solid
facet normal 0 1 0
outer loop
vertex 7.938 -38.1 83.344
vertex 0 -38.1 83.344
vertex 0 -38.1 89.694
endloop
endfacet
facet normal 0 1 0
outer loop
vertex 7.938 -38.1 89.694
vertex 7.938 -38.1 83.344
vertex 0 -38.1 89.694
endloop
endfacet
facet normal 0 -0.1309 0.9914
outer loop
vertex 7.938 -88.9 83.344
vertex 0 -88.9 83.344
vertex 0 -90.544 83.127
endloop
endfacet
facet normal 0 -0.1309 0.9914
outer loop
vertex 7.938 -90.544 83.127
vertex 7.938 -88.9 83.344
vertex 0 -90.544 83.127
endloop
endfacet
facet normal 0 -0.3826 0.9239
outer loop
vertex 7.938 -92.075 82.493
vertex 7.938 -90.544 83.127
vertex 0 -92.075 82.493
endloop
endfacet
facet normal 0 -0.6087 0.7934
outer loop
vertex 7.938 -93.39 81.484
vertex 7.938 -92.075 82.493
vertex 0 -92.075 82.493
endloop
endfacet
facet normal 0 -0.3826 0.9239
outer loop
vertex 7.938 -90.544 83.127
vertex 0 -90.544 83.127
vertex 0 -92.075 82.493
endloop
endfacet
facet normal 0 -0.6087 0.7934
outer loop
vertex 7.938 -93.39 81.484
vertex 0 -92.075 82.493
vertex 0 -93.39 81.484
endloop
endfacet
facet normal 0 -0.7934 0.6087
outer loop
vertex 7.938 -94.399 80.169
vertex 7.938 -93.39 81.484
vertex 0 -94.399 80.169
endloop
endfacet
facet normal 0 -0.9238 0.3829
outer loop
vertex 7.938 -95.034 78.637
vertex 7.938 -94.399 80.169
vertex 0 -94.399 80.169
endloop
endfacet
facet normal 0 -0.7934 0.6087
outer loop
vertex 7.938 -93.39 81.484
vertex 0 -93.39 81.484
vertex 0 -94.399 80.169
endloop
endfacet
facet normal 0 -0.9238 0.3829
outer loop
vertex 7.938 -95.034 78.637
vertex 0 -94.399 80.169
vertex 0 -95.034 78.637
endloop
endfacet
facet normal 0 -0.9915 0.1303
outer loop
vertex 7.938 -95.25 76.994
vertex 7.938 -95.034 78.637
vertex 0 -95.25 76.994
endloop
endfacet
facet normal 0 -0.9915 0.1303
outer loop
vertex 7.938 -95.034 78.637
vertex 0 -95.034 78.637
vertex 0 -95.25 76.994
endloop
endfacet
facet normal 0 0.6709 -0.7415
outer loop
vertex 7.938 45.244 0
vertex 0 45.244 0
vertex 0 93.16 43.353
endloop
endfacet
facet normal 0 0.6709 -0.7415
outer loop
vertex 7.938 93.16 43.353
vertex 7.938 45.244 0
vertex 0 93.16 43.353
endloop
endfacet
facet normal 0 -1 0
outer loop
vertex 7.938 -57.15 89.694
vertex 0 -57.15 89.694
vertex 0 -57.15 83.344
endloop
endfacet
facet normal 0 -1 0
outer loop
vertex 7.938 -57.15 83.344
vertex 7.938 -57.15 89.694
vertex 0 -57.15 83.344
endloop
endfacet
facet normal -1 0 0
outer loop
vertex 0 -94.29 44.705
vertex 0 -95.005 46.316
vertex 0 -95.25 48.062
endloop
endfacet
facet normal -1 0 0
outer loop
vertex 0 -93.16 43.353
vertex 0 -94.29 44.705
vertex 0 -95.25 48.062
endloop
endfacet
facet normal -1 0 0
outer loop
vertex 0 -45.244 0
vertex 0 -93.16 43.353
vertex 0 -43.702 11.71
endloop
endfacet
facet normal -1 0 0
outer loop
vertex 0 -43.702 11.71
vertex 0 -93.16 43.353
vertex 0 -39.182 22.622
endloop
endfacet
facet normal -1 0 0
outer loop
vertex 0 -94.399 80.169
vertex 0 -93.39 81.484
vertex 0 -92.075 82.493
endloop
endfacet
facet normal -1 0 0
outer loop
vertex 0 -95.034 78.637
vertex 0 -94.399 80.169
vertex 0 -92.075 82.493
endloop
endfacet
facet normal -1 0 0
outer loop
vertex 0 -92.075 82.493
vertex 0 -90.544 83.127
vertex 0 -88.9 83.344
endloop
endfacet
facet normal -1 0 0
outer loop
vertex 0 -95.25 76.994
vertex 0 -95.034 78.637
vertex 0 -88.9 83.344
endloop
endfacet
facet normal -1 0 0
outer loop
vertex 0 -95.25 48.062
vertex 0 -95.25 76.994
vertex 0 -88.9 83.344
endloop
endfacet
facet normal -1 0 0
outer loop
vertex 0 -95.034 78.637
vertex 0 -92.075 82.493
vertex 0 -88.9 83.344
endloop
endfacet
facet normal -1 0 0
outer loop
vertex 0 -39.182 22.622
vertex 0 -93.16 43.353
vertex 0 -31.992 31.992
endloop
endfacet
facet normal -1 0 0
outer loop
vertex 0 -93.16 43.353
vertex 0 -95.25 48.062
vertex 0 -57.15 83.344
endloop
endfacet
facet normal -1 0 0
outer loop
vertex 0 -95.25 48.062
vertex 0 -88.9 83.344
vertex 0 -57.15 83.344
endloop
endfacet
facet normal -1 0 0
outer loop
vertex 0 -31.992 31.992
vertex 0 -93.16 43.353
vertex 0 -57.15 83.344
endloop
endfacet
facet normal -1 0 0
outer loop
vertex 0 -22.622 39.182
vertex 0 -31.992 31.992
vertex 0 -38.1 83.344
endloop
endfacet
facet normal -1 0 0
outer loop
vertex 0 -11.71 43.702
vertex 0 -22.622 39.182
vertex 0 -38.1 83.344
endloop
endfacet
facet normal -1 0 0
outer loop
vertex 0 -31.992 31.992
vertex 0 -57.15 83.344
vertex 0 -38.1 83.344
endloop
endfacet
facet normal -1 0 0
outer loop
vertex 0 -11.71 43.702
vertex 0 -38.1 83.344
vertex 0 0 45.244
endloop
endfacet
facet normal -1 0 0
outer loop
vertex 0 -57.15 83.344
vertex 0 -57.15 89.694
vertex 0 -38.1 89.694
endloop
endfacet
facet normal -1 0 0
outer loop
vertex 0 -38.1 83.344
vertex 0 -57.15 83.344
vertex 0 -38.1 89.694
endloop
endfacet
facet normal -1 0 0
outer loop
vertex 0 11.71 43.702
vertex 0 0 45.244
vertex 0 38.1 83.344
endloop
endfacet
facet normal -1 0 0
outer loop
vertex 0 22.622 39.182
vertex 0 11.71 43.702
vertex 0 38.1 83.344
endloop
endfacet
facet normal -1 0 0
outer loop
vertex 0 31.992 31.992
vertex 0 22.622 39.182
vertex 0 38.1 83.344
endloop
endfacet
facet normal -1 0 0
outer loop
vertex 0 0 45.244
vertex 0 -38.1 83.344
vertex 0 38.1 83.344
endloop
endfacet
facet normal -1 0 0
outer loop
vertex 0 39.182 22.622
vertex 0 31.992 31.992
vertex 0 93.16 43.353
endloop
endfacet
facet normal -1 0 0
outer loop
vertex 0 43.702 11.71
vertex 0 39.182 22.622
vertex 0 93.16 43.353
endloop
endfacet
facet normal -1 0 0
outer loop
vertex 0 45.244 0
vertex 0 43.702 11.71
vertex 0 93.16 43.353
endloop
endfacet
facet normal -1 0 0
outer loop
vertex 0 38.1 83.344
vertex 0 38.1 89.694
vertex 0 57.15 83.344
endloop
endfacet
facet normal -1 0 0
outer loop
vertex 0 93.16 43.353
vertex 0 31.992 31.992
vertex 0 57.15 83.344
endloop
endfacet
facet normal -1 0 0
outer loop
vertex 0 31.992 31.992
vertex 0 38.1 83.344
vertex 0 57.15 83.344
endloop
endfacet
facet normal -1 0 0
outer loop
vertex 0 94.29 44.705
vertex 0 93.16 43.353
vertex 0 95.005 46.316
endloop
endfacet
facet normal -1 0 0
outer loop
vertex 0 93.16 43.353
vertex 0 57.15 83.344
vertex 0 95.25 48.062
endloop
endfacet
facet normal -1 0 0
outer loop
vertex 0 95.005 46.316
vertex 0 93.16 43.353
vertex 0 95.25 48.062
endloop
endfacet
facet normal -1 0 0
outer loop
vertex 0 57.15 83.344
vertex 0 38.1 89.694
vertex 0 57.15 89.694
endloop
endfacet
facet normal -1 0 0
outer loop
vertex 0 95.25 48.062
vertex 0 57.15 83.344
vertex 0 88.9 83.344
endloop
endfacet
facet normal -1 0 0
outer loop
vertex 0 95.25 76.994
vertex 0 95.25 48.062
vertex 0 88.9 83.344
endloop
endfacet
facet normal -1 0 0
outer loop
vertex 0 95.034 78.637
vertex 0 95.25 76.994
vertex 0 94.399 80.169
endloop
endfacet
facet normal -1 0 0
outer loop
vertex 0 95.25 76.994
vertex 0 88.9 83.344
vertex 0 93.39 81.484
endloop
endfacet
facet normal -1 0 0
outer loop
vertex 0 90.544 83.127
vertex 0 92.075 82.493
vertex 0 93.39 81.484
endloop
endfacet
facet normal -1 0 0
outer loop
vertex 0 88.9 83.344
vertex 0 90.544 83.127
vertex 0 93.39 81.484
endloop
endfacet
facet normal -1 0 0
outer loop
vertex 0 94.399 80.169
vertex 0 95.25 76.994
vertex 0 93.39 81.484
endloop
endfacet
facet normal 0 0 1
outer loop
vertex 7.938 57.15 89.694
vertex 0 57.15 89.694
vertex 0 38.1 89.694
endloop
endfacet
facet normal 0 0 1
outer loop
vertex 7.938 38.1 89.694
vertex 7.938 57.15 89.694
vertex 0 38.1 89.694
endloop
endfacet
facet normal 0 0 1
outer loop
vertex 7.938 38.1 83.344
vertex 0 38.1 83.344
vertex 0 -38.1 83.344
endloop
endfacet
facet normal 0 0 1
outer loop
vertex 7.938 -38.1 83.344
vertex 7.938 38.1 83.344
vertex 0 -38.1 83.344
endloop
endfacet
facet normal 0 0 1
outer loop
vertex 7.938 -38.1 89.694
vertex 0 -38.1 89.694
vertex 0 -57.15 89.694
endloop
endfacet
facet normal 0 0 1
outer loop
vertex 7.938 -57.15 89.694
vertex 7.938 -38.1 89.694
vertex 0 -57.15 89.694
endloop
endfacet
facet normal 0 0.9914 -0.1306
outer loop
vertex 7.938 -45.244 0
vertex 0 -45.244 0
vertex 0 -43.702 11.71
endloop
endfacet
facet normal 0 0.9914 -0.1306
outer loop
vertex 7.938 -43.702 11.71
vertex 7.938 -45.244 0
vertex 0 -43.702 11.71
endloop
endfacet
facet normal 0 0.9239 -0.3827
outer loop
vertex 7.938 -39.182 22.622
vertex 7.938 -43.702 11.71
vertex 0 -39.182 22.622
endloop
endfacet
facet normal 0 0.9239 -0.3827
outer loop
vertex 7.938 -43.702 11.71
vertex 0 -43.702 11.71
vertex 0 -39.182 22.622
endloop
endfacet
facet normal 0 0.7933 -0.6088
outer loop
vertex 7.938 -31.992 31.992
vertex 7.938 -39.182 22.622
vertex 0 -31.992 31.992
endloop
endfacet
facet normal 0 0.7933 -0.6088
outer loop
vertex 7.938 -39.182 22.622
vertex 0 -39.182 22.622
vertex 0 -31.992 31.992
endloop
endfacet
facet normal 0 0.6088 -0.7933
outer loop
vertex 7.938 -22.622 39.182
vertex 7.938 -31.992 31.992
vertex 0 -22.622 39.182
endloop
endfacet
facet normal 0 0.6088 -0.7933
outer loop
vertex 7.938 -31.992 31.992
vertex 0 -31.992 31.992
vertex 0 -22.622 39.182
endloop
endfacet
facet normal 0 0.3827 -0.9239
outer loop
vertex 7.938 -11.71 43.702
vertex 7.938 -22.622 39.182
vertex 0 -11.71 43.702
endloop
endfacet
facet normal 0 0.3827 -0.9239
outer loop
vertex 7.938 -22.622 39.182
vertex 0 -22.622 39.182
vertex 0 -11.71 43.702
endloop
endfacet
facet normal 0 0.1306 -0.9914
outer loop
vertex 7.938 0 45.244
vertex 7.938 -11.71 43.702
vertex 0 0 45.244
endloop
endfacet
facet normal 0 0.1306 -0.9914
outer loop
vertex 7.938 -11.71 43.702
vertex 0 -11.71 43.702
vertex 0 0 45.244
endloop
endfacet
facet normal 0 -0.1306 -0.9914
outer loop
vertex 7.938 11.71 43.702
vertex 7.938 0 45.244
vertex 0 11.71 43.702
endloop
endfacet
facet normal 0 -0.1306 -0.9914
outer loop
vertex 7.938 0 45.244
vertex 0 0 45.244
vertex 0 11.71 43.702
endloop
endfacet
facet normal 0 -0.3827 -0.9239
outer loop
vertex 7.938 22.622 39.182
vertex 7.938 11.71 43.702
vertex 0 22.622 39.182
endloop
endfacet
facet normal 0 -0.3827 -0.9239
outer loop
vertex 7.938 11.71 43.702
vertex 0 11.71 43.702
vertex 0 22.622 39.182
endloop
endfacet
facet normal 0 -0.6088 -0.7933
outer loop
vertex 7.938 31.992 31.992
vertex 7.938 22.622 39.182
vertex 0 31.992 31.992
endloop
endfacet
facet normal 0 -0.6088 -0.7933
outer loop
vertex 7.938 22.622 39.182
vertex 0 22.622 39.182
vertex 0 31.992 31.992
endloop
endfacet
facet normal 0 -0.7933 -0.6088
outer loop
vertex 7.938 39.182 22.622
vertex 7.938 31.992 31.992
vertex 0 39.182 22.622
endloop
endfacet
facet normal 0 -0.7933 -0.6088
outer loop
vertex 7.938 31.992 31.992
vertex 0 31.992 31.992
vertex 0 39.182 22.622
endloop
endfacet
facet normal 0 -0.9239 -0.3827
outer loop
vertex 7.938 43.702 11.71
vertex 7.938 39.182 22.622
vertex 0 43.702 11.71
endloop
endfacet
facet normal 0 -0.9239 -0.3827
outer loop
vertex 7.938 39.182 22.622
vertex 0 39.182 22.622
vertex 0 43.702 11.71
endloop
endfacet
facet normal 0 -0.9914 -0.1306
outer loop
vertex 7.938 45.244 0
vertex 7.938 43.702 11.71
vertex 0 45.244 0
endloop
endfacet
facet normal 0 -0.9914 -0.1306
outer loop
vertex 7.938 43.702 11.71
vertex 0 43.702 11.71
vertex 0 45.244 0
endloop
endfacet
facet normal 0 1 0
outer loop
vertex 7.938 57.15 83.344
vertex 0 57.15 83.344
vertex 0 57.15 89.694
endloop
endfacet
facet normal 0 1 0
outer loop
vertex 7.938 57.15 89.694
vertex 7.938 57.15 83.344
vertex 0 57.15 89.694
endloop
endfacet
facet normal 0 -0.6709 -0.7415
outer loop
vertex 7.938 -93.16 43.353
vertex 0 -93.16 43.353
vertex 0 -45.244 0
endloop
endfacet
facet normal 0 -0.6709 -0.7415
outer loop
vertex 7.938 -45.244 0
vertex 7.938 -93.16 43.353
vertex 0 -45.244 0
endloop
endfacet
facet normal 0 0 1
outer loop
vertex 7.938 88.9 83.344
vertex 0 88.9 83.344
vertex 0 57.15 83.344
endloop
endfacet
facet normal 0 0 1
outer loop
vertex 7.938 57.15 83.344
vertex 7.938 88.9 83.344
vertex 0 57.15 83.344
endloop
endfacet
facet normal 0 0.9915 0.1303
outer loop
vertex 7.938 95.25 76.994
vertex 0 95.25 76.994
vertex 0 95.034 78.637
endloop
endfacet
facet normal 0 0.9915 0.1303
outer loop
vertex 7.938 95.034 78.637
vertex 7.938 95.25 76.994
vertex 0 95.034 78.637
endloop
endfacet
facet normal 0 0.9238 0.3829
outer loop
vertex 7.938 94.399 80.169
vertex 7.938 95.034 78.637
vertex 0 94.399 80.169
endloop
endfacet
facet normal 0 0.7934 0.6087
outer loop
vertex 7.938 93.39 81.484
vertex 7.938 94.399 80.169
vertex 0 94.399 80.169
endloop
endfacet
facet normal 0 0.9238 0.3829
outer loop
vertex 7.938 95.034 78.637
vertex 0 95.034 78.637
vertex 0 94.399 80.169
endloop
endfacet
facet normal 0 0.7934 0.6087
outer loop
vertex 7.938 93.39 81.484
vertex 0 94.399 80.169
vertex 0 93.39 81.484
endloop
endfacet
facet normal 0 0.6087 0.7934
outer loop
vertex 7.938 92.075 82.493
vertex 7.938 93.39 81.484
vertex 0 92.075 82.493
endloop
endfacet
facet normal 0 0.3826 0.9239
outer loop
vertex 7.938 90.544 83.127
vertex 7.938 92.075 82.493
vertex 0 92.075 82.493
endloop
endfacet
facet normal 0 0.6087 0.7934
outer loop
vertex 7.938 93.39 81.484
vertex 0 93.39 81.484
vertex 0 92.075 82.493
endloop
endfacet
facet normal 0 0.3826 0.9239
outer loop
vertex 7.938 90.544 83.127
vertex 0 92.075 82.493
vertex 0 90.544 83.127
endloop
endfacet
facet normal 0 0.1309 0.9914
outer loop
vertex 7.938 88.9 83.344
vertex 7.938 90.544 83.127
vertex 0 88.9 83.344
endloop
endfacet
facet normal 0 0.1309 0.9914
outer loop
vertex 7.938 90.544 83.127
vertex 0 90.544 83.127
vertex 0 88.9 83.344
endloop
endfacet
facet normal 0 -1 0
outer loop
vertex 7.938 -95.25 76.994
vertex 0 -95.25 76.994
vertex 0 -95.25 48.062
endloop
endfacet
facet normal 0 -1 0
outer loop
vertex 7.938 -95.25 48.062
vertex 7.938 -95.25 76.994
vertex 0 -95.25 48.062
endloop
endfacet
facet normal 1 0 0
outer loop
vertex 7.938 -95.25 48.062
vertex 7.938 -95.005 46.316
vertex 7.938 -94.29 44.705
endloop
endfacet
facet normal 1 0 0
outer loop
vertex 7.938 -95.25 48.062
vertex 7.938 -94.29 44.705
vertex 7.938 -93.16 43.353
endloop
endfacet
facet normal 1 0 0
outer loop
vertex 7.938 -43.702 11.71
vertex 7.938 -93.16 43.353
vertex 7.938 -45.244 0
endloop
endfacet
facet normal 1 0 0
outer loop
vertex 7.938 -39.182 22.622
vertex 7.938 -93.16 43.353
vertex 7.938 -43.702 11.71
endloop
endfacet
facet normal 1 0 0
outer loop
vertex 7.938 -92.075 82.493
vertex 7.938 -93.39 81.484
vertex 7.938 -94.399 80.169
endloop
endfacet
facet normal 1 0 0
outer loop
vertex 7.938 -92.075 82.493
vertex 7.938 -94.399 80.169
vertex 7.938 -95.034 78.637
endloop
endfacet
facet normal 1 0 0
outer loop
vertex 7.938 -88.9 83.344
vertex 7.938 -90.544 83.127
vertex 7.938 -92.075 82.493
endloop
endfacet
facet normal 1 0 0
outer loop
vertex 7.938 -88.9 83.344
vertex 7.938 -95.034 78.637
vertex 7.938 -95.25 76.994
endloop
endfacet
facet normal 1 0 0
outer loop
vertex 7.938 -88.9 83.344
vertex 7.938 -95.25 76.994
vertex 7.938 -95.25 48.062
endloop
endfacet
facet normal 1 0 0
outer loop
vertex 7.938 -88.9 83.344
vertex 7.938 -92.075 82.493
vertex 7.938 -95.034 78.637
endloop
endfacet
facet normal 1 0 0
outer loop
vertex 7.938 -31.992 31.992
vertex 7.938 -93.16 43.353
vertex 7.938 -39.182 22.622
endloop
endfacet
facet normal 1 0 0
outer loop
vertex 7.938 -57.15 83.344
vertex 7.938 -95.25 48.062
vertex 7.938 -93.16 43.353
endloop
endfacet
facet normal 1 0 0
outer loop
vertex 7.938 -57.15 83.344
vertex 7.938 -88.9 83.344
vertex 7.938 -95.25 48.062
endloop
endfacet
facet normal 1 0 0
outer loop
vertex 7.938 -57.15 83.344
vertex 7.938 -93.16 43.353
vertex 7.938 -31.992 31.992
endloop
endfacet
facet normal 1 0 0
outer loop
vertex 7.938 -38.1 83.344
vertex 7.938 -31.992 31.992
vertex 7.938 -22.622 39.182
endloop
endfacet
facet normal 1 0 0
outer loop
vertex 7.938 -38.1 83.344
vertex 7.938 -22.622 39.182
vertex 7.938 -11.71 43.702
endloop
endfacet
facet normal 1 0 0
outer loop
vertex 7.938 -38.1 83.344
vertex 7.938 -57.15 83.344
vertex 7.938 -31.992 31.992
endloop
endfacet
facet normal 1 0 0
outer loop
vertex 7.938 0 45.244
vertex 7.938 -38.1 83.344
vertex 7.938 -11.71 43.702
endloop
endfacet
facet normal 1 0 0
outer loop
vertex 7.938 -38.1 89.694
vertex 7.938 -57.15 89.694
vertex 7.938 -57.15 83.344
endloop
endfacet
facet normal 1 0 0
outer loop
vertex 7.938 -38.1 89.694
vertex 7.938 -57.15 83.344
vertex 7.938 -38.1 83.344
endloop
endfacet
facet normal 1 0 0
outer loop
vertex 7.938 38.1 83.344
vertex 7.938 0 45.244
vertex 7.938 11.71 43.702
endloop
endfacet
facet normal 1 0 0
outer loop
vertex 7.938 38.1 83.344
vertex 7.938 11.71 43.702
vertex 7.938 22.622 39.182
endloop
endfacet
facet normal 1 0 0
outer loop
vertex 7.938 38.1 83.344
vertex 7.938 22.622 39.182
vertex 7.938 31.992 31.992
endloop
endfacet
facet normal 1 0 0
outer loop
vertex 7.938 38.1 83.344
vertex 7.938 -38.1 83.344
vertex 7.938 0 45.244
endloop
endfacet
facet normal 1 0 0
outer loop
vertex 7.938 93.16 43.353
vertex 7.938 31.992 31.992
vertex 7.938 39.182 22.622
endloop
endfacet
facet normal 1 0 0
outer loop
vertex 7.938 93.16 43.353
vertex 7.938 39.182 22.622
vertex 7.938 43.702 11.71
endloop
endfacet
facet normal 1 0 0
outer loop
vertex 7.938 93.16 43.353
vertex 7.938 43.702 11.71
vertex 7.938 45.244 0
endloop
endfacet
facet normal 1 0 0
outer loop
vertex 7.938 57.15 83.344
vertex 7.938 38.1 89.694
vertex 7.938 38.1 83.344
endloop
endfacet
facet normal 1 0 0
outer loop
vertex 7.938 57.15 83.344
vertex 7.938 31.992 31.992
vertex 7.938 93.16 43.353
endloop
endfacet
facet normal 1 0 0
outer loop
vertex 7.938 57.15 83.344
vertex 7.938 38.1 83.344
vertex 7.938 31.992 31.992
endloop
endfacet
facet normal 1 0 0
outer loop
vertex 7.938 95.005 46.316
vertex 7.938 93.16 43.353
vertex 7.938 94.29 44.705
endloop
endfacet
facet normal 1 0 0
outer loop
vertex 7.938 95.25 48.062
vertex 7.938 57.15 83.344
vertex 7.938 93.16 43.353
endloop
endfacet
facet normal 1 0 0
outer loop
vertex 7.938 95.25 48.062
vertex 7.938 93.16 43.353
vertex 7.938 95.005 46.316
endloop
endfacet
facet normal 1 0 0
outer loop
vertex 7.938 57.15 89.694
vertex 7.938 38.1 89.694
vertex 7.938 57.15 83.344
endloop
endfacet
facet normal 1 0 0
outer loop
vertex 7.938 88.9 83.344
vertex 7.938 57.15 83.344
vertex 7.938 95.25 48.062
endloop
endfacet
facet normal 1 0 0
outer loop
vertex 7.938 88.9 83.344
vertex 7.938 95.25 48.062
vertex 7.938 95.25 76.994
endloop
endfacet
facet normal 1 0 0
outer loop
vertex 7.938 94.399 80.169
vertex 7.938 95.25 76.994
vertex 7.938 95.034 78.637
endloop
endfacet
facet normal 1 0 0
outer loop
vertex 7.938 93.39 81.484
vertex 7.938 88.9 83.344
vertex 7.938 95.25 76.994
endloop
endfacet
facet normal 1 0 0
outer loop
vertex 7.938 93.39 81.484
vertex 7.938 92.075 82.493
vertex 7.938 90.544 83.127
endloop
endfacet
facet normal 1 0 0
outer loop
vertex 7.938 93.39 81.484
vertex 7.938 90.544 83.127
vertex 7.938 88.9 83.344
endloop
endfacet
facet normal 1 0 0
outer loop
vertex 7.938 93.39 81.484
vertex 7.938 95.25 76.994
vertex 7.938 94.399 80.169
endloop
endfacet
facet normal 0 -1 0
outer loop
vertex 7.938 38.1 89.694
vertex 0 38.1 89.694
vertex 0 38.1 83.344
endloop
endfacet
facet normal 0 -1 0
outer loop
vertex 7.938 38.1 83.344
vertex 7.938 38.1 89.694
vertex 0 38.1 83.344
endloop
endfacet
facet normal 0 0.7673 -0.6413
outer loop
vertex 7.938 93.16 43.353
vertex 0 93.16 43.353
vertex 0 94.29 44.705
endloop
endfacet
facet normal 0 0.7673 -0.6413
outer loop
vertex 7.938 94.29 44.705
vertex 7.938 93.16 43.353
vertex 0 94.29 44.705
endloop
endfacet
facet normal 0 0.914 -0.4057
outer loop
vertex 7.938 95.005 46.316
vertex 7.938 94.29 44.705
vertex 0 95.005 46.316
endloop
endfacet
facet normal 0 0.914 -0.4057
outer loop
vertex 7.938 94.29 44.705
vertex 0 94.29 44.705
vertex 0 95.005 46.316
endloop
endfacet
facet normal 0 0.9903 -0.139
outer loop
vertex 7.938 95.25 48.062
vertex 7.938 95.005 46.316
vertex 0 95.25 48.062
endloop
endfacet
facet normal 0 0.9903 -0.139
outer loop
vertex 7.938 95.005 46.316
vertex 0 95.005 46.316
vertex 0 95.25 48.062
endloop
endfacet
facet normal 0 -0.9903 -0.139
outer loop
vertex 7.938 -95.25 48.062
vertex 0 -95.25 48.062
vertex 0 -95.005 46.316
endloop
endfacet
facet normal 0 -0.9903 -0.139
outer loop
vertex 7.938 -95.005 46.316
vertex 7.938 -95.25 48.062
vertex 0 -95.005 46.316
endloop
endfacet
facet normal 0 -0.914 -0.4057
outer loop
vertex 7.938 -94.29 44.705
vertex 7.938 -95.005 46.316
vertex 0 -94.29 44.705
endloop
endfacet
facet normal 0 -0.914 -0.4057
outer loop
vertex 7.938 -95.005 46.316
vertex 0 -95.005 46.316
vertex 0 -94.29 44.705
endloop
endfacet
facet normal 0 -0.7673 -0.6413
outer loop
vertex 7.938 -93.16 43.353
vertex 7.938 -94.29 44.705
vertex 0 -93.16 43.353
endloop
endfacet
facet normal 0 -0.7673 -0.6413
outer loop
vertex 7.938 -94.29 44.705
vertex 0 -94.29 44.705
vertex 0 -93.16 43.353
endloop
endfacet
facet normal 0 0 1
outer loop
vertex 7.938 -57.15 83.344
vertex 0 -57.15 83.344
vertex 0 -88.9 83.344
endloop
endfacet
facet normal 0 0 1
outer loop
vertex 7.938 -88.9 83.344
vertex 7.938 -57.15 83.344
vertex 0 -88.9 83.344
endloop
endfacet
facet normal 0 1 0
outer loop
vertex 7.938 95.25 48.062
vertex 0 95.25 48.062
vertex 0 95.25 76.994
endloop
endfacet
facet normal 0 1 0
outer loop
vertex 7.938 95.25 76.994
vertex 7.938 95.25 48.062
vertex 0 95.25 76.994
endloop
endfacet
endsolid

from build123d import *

# Parameters (mm, degrees)
F1_DEPTH = 7.9375


with BuildPart() as f1:
    # F0 (on Right) → F1 (new body)
    with BuildSketch(Plane.YZ):
        with BuildLine():
            ThreePointArc((-45.24375, 0), (0, 45.24375), (45.24375, 0))
            Line((45.24375, 0), (93.1603, 43.353069))
            ThreePointArc((93.1603, 43.353069), (94.704111, 45.486011), (95.25, 48.061821))
            Line((95.25, 48.061821), (95.25, 76.99375))
            ThreePointArc((95.25, 76.99375), (93.390128, 81.483878), (88.9, 83.34375))
            Line((88.9, 83.34375), (57.15, 83.34375))
            Line((57.15, 83.34375), (57.15, 89.69375))
            Line((57.15, 89.69375), (38.1, 89.69375))
            Line((38.1, 89.69375), (38.1, 83.34375))
            Line((38.1, 83.34375), (-38.1, 83.34375))
            Line((-38.1, 83.34375), (-38.1, 89.69375))
            Line((-38.1, 89.69375), (-57.15, 89.69375))
            Line((-57.15, 89.69375), (-57.15, 83.34375))
            Line((-57.15, 83.34375), (-88.9, 83.34375))
            ThreePointArc((-88.9, 83.34375), (-93.390128, 81.483878), (-95.25, 76.99375))
            Line((-95.25, 76.99375), (-95.25, 48.061821))
            ThreePointArc((-95.25, 48.061821), (-94.704111, 45.486011), (-93.1603, 43.353069))
            Line((-93.1603, 43.353069), (-45.24375, 0))
        make_face()
    extrude(amount=F1_DEPTH)


solid = f1.part
